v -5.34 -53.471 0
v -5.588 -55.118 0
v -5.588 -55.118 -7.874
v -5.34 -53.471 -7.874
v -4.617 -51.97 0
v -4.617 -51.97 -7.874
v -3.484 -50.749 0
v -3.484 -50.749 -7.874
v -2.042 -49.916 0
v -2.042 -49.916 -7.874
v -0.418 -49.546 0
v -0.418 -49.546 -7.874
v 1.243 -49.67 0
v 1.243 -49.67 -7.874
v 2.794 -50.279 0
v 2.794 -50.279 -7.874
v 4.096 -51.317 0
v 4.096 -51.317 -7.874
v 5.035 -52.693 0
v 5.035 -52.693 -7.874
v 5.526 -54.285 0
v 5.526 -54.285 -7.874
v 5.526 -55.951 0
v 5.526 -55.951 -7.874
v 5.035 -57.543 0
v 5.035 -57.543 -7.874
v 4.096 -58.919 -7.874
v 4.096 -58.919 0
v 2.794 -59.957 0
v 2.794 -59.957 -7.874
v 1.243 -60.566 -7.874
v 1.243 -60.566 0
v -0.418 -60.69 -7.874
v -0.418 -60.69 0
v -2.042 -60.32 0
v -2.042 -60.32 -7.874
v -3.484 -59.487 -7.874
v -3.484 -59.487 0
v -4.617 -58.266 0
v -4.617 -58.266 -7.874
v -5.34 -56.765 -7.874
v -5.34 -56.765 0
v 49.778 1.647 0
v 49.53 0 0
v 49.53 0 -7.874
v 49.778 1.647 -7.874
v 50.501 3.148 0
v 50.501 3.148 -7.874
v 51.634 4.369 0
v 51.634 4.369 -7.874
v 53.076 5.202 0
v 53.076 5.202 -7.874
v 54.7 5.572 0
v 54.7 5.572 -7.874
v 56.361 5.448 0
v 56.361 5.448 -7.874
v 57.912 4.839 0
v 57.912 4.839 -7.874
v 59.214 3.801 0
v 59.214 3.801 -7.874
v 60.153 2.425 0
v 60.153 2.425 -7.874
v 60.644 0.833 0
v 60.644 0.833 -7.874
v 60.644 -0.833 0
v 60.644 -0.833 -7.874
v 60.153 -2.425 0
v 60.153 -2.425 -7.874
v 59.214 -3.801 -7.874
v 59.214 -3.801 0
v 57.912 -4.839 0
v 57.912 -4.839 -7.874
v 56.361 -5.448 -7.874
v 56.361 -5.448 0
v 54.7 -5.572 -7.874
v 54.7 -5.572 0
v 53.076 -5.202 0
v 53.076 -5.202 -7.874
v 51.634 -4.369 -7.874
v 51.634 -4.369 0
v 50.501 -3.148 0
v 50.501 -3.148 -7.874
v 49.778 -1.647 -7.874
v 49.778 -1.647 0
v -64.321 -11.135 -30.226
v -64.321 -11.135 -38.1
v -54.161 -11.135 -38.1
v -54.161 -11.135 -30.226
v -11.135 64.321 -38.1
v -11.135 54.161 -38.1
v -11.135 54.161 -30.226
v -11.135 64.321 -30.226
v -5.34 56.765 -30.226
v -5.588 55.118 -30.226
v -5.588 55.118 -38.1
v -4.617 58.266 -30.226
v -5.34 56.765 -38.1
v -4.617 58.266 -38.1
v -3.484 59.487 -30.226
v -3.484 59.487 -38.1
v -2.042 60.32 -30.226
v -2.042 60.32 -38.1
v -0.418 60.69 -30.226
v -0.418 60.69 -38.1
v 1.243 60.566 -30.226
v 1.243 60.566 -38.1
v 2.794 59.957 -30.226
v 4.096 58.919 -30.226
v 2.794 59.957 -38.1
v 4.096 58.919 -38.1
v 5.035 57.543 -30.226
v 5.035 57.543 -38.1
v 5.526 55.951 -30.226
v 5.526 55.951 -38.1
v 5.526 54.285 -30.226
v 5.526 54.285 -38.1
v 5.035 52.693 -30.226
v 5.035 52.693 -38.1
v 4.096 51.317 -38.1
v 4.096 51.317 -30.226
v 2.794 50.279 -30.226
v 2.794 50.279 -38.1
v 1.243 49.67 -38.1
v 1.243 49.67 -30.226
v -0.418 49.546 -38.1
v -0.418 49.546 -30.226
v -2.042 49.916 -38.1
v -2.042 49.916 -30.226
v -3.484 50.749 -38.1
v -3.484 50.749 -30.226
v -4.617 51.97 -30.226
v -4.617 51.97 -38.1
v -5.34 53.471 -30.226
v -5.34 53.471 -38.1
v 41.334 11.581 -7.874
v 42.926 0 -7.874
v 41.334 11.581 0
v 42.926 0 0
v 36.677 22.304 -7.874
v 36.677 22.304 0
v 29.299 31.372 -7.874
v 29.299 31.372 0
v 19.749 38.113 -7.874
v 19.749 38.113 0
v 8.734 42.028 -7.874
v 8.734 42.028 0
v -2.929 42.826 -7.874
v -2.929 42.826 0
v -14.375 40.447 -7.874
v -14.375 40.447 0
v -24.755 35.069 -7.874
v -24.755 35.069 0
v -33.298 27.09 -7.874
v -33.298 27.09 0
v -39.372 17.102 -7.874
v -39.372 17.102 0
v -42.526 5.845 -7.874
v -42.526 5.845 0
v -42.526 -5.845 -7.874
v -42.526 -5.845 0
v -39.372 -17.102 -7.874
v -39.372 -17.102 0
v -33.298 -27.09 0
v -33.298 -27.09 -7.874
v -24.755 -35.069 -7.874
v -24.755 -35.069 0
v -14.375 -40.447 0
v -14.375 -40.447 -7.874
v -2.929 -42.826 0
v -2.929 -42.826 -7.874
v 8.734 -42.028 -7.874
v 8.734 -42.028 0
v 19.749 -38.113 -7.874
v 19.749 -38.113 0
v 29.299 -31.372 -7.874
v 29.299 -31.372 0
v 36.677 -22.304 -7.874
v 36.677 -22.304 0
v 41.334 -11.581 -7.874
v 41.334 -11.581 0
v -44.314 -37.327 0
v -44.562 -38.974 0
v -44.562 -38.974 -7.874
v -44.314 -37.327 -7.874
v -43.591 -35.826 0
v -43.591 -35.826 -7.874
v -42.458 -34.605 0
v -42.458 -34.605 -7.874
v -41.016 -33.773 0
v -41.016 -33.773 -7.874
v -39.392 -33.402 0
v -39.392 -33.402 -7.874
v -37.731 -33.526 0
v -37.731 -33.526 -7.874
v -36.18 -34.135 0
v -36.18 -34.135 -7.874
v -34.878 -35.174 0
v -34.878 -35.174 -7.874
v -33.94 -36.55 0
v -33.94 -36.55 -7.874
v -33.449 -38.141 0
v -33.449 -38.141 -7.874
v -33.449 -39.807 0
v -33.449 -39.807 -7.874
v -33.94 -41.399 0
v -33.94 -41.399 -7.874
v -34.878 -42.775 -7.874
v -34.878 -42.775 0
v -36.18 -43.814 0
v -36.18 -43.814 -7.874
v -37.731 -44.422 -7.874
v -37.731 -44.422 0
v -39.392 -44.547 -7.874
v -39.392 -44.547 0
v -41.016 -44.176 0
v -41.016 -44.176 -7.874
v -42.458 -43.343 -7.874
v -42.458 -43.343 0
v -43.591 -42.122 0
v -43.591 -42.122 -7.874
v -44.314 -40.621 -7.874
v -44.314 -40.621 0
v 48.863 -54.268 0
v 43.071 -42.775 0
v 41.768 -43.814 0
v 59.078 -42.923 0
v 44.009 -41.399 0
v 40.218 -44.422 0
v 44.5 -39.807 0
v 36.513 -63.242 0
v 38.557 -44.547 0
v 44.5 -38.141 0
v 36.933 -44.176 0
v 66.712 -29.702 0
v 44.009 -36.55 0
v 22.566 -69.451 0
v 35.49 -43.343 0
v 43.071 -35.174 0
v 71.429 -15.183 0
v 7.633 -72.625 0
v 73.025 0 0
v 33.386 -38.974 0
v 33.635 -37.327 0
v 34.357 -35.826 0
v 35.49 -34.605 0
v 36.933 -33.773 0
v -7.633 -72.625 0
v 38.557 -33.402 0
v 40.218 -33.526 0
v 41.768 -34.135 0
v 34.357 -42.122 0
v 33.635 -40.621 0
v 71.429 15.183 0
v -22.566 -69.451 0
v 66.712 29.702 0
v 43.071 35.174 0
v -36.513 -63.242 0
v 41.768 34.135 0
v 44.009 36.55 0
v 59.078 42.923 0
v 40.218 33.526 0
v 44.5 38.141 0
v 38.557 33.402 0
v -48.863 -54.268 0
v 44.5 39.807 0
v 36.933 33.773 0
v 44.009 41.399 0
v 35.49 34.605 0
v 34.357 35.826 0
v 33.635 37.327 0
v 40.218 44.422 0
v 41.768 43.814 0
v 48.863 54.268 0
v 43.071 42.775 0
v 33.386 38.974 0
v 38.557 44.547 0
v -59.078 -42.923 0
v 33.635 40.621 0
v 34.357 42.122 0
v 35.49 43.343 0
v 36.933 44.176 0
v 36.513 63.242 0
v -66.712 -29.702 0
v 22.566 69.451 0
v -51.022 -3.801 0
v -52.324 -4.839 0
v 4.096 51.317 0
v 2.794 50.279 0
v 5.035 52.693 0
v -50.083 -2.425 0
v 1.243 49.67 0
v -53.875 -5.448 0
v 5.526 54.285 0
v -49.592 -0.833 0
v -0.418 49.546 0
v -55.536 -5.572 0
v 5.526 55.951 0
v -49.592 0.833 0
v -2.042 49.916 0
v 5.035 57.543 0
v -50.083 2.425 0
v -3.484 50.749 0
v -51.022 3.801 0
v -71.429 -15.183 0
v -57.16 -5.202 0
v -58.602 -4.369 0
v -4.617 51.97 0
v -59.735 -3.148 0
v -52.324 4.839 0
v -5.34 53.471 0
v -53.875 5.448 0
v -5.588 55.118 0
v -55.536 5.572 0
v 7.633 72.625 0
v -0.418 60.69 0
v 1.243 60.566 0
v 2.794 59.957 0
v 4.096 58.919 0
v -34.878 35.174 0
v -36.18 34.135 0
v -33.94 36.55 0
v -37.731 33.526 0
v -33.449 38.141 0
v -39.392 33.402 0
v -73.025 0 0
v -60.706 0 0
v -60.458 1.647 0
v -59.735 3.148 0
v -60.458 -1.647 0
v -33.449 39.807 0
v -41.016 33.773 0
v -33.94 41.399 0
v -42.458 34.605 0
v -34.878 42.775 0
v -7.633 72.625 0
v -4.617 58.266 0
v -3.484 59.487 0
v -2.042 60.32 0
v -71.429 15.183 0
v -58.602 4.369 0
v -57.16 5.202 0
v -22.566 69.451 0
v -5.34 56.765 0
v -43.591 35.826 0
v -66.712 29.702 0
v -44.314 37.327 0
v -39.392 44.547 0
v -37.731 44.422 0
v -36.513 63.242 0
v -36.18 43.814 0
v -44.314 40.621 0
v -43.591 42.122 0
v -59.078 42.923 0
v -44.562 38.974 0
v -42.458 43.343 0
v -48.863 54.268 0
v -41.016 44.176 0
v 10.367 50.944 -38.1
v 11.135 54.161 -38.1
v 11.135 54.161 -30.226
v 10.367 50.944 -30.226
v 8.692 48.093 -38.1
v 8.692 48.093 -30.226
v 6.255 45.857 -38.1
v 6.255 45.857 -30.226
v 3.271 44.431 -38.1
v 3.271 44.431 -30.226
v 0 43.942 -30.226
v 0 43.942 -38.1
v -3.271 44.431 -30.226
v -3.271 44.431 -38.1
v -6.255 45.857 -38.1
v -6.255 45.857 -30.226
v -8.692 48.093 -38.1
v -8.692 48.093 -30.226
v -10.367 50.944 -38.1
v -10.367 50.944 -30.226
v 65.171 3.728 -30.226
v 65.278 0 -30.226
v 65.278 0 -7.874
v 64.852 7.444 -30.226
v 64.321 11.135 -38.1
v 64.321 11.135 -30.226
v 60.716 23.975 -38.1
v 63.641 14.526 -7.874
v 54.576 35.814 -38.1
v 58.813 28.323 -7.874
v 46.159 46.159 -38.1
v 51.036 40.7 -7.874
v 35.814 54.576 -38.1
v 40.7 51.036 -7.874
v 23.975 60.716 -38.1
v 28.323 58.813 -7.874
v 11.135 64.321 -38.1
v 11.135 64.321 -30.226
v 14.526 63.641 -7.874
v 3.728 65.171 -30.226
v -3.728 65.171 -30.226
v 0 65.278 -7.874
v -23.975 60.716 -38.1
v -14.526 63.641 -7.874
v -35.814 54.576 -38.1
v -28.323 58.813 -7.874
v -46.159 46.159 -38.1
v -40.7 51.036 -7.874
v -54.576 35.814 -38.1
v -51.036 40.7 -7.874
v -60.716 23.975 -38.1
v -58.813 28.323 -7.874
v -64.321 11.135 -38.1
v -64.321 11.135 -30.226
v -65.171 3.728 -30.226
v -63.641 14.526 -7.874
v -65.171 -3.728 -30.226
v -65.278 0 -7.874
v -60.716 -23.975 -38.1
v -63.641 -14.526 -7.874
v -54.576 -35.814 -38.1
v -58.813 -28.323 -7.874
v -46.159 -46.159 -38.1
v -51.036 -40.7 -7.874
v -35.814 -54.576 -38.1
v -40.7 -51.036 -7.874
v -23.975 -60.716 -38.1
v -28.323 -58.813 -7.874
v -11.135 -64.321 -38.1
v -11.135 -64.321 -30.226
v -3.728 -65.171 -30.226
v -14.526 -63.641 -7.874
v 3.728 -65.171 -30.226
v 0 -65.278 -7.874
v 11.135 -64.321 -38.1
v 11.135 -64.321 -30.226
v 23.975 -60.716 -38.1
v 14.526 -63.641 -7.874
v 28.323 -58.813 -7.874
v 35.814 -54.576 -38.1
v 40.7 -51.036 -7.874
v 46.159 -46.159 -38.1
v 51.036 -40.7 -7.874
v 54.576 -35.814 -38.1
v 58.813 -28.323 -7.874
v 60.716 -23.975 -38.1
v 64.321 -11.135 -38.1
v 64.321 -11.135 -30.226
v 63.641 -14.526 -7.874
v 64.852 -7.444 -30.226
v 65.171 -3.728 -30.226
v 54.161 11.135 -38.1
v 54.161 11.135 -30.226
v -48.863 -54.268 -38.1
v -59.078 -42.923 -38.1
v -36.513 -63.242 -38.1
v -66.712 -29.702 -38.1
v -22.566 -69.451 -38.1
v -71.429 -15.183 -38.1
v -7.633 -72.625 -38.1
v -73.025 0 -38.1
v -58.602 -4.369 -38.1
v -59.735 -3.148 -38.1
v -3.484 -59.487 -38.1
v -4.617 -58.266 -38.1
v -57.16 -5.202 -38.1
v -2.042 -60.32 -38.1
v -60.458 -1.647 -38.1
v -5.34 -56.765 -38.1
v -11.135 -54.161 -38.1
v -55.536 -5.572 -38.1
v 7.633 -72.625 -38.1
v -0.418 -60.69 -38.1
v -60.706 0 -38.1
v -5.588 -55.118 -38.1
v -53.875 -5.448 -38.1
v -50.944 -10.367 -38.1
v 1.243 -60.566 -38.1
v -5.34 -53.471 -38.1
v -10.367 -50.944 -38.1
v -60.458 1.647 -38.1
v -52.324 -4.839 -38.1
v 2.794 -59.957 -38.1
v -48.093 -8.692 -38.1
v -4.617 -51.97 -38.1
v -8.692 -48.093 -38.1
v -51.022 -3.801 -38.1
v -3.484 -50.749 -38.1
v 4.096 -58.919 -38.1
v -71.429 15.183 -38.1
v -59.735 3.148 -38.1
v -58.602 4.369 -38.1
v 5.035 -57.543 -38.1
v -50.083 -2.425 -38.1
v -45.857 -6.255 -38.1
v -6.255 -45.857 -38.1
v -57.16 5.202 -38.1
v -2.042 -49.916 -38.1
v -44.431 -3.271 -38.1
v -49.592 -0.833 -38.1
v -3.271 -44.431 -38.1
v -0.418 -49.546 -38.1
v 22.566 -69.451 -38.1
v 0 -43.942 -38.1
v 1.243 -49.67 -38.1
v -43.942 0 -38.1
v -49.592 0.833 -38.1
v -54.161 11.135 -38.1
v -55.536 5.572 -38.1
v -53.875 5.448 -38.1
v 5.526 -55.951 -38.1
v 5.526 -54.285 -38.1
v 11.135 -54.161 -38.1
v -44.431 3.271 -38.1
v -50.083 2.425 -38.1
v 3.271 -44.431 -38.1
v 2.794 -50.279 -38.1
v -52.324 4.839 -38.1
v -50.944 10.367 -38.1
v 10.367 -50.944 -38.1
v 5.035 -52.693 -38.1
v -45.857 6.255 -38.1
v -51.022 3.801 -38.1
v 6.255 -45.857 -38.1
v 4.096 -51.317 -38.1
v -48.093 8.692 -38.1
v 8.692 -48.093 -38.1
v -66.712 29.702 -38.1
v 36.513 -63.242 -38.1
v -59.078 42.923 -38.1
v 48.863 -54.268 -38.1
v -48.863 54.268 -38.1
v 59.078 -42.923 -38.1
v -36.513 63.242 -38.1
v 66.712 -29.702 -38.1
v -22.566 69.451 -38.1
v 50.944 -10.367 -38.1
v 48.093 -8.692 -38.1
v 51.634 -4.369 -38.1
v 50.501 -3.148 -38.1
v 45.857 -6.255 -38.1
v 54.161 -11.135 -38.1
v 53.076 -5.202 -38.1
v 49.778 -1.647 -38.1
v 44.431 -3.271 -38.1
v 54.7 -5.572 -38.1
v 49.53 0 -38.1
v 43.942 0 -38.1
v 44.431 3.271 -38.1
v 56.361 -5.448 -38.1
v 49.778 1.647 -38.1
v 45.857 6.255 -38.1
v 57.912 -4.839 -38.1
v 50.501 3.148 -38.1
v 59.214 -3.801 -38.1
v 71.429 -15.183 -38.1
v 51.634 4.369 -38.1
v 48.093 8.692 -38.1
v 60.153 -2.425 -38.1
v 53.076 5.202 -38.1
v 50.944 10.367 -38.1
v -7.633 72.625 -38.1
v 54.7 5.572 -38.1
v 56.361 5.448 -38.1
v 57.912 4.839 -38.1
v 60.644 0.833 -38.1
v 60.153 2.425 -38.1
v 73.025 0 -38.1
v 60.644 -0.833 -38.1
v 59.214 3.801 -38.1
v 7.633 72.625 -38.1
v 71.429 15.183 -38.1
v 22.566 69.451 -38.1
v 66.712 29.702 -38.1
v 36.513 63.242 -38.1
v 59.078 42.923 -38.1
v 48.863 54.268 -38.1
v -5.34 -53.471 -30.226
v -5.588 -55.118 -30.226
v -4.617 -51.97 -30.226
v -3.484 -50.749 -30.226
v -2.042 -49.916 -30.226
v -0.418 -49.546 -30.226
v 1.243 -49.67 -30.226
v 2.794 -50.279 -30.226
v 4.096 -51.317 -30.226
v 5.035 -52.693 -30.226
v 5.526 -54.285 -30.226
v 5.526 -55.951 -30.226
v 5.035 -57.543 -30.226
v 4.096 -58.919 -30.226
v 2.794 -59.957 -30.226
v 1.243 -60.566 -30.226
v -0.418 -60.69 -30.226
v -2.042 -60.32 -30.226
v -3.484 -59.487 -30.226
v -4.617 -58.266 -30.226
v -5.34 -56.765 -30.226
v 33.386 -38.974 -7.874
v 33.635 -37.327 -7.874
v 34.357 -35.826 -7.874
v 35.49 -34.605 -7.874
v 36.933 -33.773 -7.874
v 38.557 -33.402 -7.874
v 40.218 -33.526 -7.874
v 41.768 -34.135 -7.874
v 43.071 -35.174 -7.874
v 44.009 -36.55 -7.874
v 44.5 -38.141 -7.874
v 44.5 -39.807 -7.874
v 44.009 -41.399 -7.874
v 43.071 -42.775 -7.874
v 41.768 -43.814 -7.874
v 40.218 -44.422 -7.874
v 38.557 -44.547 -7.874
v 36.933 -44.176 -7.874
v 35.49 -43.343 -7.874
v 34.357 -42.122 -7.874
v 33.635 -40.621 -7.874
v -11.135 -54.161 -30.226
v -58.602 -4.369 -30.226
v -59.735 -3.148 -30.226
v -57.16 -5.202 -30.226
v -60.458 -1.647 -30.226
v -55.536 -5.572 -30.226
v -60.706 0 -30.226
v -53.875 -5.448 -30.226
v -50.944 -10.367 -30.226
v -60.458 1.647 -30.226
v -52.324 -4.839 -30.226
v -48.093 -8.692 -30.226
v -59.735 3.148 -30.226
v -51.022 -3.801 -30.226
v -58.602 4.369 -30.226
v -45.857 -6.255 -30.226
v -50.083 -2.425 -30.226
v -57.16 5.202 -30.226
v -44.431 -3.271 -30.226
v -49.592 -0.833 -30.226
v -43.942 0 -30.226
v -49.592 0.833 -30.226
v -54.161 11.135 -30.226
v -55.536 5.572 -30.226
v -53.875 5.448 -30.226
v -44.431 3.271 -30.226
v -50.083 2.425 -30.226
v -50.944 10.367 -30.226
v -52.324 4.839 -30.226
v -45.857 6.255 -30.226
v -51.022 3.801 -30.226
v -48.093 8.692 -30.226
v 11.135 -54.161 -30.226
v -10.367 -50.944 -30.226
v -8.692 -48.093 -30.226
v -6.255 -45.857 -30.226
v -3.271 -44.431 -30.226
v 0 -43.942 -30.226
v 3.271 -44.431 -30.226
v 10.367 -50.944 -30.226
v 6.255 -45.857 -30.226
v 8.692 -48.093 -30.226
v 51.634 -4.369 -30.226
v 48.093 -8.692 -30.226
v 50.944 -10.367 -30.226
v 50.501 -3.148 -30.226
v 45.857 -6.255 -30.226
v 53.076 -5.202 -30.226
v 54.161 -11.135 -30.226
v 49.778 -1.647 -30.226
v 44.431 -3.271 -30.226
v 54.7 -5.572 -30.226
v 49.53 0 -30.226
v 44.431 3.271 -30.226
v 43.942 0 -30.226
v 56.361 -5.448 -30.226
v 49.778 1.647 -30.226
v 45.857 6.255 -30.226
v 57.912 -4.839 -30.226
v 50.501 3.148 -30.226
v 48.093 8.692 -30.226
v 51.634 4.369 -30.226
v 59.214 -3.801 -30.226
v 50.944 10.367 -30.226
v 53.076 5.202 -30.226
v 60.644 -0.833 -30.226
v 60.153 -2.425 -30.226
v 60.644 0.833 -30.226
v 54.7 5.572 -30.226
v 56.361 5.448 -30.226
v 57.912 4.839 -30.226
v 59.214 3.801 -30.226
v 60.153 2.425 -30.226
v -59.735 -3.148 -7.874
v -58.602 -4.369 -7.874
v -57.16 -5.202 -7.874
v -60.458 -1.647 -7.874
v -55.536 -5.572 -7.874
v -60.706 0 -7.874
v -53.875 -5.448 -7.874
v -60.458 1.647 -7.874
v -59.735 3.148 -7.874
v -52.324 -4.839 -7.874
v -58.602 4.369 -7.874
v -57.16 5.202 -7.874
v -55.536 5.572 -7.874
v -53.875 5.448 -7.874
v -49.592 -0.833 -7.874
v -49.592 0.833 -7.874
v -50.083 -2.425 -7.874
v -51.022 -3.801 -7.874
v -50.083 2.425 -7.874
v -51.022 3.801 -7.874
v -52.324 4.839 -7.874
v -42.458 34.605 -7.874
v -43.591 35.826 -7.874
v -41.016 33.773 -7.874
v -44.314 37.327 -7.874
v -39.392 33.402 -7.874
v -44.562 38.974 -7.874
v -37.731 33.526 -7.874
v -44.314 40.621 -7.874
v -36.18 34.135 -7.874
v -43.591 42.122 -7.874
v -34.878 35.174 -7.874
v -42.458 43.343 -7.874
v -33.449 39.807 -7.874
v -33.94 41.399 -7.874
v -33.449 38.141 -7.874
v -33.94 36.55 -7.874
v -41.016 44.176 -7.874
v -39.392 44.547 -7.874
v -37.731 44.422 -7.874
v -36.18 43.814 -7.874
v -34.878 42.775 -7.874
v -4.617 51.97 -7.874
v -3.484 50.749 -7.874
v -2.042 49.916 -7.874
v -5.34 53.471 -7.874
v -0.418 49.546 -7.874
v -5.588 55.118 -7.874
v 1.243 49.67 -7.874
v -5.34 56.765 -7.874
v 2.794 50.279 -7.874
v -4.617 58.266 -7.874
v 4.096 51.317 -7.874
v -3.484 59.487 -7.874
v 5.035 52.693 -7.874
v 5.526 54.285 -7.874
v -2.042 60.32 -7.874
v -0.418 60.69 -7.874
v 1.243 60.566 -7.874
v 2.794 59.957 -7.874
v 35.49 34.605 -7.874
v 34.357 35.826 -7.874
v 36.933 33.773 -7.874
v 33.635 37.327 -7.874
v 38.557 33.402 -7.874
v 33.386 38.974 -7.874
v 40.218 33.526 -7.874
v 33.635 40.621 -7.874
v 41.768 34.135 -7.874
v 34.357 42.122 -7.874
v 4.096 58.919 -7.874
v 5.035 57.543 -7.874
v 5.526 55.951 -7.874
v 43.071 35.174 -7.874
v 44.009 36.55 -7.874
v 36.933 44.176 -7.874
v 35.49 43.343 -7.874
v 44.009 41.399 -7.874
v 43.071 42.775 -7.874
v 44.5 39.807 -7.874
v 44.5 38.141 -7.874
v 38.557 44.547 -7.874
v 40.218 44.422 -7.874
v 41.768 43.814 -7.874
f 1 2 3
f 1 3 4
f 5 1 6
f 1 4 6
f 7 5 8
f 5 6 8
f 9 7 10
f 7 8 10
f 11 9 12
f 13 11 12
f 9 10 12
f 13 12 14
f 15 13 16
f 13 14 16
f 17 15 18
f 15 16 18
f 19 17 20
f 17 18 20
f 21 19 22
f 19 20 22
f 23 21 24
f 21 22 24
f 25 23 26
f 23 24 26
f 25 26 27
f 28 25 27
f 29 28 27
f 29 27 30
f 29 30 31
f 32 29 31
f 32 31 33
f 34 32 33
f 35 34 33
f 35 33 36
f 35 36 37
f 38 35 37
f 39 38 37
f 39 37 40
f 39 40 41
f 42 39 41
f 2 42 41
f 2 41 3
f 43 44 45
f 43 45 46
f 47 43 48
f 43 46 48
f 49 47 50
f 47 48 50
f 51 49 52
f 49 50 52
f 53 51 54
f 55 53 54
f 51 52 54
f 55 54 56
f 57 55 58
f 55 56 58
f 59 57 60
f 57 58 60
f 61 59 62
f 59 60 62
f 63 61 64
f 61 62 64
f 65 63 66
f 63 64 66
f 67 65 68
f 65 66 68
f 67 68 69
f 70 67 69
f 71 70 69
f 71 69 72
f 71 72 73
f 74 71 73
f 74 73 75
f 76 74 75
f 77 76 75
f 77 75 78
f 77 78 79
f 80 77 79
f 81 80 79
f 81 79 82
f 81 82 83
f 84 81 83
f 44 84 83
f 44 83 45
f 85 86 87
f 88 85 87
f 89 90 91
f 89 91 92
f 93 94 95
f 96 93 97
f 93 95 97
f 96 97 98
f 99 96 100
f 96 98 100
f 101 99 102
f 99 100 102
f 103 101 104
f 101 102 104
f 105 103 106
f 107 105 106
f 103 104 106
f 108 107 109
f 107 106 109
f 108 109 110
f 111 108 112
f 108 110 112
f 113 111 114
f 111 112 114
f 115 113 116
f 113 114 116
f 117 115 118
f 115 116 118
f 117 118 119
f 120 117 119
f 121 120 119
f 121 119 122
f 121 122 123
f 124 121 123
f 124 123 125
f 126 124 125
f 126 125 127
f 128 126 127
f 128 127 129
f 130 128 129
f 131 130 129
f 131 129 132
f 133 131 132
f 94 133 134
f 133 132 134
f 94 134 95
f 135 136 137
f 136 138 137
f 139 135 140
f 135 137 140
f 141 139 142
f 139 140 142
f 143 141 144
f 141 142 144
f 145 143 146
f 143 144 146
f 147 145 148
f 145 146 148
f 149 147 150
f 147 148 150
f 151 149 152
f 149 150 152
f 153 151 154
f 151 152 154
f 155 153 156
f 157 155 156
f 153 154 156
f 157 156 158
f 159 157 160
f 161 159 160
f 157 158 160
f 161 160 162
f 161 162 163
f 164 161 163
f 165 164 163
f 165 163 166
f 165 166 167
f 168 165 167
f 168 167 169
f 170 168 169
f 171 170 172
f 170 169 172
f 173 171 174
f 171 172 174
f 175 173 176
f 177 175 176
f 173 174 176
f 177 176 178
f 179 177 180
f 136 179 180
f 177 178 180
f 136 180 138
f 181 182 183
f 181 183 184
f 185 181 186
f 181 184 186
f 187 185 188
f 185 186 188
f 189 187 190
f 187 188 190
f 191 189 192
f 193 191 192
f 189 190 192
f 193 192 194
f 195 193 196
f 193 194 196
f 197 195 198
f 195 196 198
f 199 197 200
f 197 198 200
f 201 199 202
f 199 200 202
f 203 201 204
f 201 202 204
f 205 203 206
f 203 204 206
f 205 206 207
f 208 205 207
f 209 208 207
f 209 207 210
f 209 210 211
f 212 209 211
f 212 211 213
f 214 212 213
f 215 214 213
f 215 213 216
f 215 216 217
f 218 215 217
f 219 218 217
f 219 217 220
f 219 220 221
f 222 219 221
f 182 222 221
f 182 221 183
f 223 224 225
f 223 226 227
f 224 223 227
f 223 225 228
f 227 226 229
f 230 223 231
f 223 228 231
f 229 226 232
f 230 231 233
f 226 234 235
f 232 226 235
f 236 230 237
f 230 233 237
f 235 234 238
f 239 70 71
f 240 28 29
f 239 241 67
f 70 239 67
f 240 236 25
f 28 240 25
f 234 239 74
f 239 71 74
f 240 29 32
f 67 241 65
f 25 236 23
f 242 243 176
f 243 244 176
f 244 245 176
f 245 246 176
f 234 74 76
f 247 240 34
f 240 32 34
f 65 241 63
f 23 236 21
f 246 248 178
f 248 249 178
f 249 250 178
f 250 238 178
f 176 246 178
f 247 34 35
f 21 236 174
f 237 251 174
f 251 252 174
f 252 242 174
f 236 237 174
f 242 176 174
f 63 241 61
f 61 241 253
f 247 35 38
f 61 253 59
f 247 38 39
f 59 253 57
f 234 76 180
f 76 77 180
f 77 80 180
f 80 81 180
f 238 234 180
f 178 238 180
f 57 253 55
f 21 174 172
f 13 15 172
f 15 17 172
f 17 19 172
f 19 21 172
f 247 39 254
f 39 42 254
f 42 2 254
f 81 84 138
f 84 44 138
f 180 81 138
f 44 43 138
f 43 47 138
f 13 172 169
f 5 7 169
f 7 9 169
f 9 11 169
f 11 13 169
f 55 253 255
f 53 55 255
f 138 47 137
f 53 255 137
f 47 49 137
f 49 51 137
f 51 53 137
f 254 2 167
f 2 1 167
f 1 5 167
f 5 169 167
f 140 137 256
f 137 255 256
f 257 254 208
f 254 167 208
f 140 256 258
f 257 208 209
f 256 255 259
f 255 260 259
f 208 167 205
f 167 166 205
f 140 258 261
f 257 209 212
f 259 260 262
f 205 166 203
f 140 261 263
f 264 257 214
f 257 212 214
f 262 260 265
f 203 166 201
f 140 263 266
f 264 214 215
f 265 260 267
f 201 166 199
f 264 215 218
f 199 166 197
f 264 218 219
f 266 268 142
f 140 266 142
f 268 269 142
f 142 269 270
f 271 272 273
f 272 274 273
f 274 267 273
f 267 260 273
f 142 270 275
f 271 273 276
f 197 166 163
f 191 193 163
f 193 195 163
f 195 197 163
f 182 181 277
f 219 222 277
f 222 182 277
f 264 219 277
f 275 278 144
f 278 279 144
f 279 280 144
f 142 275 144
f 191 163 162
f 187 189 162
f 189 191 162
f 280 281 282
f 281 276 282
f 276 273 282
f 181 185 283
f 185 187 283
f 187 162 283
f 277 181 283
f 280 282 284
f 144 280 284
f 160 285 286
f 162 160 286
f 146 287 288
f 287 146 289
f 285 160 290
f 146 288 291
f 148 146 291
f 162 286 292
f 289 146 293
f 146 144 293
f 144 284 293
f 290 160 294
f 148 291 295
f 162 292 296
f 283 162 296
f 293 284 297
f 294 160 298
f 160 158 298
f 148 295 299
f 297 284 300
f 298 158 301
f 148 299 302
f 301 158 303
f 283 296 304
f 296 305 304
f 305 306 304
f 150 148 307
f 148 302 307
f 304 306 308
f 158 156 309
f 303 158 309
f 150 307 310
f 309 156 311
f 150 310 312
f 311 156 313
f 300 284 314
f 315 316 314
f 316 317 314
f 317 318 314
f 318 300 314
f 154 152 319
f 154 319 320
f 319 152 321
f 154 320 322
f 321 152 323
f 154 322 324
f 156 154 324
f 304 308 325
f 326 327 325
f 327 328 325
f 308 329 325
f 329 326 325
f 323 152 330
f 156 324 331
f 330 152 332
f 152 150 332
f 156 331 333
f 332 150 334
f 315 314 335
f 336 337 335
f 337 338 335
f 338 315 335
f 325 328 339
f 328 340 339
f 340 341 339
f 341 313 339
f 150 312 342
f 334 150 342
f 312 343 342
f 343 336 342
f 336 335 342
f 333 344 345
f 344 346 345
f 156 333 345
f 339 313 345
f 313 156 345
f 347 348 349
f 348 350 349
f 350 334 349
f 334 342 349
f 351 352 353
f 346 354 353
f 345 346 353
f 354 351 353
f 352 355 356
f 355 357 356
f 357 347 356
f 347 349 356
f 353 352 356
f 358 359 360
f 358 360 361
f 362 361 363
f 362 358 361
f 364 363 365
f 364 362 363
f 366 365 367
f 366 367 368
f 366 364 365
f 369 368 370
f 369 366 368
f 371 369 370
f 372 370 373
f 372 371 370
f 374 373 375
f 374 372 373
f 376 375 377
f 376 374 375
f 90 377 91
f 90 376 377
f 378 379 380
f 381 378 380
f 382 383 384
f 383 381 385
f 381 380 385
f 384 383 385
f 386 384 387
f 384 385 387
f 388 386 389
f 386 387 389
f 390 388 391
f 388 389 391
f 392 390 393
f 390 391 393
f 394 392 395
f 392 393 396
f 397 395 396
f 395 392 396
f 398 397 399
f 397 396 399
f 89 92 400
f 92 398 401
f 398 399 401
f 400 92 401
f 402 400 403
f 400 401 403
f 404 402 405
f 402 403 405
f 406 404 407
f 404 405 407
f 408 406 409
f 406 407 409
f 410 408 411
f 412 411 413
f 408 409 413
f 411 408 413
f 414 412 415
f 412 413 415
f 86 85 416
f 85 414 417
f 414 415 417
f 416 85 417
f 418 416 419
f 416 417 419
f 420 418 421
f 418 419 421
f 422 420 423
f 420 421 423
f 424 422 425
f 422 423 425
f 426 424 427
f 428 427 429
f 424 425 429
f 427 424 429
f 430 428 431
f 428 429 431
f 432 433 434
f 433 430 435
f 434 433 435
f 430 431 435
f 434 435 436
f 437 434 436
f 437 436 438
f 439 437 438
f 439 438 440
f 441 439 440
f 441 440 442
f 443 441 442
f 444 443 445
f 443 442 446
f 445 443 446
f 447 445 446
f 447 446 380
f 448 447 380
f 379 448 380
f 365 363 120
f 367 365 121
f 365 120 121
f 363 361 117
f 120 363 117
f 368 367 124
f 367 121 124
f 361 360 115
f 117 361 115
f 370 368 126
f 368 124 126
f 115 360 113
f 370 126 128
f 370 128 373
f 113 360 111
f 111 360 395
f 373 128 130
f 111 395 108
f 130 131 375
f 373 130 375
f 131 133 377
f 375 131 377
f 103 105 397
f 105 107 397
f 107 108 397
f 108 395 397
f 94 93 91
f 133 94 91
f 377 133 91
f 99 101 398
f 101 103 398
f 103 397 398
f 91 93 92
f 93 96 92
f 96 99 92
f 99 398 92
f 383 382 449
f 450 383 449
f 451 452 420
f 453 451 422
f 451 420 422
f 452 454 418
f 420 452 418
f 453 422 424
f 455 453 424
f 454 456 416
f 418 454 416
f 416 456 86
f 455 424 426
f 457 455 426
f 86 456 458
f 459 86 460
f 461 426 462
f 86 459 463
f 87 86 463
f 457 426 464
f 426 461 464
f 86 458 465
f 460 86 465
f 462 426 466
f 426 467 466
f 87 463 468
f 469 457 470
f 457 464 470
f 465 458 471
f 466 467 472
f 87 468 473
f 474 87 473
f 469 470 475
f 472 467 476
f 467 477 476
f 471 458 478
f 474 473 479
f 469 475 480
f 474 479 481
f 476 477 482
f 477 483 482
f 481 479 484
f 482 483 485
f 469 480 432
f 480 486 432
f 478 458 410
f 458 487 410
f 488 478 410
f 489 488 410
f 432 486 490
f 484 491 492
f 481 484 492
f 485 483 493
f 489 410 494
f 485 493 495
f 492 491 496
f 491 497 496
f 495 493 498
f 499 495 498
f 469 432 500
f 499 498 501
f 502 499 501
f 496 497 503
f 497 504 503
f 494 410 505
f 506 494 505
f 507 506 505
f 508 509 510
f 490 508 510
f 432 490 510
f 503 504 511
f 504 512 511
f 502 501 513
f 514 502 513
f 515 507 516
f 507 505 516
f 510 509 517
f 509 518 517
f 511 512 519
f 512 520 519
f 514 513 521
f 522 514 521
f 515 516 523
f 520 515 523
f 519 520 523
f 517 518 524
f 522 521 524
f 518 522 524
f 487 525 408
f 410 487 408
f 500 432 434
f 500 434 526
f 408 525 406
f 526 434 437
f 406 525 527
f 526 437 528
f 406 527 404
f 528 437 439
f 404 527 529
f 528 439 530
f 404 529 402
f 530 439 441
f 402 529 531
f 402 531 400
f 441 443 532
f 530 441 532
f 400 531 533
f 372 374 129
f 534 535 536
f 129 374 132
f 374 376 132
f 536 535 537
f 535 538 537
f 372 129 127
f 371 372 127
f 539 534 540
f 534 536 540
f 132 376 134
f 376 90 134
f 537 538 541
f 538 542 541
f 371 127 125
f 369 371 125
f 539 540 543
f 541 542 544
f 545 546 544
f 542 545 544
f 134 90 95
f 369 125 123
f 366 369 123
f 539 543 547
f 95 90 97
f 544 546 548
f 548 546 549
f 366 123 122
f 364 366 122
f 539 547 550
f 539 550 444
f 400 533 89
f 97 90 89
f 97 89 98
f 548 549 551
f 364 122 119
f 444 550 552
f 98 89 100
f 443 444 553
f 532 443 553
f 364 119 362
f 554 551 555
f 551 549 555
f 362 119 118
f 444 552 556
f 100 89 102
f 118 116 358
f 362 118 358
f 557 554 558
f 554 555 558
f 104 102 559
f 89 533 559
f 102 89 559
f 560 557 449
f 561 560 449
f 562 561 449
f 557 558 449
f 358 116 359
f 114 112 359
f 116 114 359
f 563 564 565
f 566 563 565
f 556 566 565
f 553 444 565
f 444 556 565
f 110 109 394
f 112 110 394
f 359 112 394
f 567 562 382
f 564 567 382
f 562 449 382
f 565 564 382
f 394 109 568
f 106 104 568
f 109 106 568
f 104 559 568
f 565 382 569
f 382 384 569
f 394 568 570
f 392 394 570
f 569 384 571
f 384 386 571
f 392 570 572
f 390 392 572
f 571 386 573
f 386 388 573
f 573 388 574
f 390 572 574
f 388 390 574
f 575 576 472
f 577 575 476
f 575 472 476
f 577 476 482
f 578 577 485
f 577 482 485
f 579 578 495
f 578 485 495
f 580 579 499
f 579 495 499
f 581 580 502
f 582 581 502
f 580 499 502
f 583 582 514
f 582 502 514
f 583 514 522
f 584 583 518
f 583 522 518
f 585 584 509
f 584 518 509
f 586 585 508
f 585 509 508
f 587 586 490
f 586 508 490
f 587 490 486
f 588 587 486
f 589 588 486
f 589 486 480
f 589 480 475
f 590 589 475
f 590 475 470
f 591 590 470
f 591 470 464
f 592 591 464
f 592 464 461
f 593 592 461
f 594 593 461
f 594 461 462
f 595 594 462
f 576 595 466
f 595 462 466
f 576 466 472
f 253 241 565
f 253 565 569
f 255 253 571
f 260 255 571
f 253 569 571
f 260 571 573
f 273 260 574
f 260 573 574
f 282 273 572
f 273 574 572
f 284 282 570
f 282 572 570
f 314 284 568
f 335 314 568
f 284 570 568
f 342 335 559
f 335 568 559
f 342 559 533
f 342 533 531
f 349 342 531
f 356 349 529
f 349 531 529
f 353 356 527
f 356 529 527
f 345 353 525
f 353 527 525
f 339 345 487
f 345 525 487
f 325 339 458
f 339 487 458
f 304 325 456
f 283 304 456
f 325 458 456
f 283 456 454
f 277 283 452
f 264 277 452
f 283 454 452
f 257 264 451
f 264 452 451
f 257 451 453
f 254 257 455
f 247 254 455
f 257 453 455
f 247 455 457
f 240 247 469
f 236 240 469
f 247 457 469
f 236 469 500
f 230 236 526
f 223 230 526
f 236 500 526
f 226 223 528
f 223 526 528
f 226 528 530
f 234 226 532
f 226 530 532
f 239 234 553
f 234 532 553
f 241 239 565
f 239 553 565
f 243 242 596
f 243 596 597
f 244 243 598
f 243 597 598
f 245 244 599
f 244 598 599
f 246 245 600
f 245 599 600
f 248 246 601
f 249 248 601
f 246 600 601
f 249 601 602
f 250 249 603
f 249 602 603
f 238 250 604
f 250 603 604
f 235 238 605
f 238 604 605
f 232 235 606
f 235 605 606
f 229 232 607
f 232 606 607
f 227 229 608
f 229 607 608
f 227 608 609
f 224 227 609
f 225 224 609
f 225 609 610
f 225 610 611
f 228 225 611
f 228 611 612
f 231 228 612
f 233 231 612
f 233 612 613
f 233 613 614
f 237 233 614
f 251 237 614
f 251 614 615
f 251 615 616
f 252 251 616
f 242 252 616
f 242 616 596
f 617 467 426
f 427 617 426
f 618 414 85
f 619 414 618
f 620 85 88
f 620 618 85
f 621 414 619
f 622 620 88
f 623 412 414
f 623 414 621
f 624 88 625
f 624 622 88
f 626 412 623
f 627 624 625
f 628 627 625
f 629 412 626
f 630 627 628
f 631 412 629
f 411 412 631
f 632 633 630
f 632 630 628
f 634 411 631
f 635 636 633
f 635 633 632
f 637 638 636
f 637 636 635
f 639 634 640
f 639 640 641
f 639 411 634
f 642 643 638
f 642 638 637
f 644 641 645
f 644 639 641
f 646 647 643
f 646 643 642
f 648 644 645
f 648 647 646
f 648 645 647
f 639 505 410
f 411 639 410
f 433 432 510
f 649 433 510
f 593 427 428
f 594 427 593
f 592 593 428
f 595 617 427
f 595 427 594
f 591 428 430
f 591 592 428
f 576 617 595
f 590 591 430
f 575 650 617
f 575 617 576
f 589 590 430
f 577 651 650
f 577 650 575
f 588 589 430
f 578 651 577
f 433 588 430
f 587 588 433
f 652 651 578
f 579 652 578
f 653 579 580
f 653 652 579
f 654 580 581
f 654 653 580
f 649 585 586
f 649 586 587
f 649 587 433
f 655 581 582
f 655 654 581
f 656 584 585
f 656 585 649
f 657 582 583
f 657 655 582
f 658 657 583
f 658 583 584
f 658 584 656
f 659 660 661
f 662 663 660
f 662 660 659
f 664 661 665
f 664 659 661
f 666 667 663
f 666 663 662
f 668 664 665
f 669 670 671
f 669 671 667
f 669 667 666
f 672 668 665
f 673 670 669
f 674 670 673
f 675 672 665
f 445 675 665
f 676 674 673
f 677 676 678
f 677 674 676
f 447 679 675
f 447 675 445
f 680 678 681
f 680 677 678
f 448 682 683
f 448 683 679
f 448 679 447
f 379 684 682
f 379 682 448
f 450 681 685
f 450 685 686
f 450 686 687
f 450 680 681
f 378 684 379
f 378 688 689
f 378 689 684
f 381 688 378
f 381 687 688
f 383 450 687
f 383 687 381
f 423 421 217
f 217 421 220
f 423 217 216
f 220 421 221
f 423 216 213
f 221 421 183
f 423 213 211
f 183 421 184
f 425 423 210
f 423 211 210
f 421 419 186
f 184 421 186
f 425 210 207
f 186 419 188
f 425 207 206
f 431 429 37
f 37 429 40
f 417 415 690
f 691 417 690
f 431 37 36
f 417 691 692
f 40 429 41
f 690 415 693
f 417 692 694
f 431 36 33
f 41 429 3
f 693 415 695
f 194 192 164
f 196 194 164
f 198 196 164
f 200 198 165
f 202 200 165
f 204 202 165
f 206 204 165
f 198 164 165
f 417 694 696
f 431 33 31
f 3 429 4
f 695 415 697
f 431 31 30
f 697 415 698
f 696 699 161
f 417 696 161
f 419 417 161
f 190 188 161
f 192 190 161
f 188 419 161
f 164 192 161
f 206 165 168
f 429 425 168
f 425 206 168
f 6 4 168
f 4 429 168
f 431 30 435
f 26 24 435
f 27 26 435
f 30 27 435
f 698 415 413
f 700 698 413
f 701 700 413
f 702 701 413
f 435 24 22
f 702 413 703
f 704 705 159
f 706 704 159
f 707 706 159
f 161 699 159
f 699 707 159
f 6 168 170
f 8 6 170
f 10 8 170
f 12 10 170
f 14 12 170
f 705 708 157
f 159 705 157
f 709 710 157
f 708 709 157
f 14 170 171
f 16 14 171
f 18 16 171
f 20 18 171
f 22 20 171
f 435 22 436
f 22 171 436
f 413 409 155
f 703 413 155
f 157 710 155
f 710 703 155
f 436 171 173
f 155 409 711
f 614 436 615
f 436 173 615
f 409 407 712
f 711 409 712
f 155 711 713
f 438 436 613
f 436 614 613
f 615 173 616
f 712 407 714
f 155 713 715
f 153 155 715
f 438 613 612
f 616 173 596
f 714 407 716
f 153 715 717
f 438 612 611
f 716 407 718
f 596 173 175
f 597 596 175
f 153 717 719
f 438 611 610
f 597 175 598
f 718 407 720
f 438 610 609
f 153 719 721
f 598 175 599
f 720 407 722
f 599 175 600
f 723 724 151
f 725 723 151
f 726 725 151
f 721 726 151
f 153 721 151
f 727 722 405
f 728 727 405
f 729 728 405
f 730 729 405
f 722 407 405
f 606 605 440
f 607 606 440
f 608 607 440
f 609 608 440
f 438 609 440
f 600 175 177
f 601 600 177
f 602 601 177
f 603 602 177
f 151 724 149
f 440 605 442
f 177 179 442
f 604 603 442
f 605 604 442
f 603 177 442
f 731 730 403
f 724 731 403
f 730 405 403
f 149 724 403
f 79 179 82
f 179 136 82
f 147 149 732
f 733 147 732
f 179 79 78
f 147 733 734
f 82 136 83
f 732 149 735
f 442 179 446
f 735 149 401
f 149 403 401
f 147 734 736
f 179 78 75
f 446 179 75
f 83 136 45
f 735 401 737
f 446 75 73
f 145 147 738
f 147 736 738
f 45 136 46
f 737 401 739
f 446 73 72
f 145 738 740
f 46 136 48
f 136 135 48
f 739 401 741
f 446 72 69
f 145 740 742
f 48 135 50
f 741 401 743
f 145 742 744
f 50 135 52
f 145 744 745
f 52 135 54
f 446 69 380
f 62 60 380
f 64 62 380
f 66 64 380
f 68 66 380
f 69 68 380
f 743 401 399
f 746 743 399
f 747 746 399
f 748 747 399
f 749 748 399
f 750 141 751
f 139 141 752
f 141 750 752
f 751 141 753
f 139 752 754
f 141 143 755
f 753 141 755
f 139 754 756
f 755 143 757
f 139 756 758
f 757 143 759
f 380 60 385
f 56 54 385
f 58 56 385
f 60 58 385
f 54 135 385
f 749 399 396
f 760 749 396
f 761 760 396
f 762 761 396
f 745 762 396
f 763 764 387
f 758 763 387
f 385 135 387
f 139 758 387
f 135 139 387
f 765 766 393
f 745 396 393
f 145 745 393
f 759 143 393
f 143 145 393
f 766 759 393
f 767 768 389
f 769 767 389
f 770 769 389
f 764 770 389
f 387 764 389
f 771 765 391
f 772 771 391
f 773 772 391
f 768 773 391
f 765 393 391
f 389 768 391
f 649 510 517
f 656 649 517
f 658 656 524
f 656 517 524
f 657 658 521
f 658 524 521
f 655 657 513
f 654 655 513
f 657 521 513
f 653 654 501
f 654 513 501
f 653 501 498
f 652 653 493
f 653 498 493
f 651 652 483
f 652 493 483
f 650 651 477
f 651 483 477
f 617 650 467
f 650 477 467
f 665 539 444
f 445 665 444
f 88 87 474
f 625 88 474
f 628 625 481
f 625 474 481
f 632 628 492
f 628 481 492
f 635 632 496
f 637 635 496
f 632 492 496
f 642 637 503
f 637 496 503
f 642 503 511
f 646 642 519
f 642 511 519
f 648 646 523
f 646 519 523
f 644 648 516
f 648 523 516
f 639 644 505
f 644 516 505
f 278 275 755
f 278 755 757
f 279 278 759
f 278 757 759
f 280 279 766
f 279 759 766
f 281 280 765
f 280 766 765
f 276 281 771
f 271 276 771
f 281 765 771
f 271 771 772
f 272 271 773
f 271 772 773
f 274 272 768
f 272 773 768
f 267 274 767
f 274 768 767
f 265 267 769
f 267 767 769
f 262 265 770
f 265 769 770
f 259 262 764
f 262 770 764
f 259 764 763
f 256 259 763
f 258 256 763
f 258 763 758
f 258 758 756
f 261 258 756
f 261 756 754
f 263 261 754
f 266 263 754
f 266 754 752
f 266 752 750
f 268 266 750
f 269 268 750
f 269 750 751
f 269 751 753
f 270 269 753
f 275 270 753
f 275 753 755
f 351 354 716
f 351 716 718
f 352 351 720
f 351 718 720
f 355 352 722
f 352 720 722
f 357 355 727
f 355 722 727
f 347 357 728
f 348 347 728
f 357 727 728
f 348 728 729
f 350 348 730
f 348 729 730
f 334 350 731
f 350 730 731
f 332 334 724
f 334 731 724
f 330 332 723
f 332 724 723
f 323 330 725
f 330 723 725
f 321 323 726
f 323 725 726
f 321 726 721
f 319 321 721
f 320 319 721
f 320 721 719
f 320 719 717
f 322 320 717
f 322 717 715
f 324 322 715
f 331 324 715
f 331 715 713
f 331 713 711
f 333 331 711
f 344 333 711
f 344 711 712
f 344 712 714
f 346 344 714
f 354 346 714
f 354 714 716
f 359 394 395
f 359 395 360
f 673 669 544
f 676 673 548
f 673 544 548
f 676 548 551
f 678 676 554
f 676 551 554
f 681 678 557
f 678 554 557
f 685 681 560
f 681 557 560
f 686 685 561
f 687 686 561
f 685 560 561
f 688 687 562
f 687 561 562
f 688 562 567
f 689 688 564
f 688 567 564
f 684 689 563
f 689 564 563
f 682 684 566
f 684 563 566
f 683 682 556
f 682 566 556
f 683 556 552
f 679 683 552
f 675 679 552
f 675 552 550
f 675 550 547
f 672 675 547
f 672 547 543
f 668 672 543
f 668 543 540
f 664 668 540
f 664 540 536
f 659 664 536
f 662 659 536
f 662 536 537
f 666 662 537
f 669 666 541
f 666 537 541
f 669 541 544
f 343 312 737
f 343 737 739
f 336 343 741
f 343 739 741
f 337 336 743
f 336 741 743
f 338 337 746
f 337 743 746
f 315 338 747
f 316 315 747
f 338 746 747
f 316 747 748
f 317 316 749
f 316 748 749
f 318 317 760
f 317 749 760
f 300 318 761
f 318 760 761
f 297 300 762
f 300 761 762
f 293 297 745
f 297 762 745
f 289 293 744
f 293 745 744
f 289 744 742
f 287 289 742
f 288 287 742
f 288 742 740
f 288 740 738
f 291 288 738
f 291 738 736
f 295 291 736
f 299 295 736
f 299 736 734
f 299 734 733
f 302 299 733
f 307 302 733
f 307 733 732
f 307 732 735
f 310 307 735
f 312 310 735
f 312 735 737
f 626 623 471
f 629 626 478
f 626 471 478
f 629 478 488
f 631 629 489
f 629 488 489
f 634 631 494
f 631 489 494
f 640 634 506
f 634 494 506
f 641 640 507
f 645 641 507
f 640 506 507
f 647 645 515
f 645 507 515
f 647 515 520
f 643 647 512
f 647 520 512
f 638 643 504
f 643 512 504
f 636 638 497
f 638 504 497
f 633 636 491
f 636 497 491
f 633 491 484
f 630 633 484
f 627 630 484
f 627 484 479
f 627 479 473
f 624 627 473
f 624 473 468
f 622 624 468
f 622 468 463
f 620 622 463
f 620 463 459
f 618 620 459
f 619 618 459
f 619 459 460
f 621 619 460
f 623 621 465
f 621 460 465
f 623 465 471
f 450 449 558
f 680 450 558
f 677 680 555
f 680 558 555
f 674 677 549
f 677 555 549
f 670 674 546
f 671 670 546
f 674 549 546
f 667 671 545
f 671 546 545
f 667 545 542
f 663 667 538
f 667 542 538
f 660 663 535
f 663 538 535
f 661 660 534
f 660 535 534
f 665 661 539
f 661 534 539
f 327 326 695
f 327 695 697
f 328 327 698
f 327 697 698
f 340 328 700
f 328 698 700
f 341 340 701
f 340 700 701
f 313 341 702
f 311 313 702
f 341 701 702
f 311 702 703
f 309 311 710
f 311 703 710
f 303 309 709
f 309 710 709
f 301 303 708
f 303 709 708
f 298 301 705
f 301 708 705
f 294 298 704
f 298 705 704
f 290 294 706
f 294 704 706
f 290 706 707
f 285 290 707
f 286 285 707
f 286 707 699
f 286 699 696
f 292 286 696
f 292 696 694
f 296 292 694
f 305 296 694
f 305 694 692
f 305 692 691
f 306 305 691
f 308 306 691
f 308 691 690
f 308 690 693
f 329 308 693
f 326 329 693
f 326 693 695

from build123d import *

# Parameters (mm, degrees)
SKETCH2_R           = 5.588
CUT_EXTRUDE1_DEPTH  = 8.874
SKETCH3_R           = 5.588
BOSS_EXTRUDE2_DEPTH = 7.874


with BuildPart() as part:
    # Sketch1 → Revolve1 (revolve)
    with BuildSketch(Plane(origin=(0, 0, 0), x_dir=(1, 0, 0), z_dir=(0, 1, 0))):
        Polygon((73.025, 0), (73.025, 7.874), (73.025, 38.1), (65.278, 38.1), (65.278, 7.874), (42.926, 7.874), (42.926, 0), align=None)
    revolve(axis=Axis((0, 0, -38.1), (0, 0, 1)))

    # Sketch2 → Cut-Extrude1 (cut, through all)
    with BuildSketch(Plane(origin=(0, 0, -7.874), x_dir=(-1, 0, 0), z_dir=(0, 0, -1))):
        with Locations((0, 55.118)):
            Circle(SKETCH2_R)
        with Locations((38.974311565, 38.974311565)):
            Circle(SKETCH2_R)
        with Locations((55.118, 0)):
            Circle(SKETCH2_R)
        with Locations((38.974311565, -38.974311565)):
            Circle(SKETCH2_R)
        with Locations((0, -55.118)):
            Circle(SKETCH2_R)
        with Locations((-38.974311565, -38.974311565)):
            Circle(SKETCH2_R)
        with Locations((-55.118, 0)):
            Circle(SKETCH2_R)
        with Locations((-38.974311565, 38.974311565)):
            Circle(SKETCH2_R)
    extrude(amount=-CUT_EXTRUDE1_DEPTH, mode=Mode.SUBTRACT)

    # Sketch3 → Boss-Extrude2 (add)
    with BuildSketch(Plane(origin=(0, 0, -38.1), x_dir=(-1, 0, 0), z_dir=(0, 0, -1))):
        with BuildLine():
            Line((11.134976442, 54.161299611), (11.134976442, 64.321299611))
            ThreePointArc((11.134976442, 64.321299611), (0, 65.278), (-11.134976442, 64.321299611))
            Line((-11.134976442, 64.321299611), (-11.134976442, 54.161299611))
            ThreePointArc((-11.134976442, 54.161299611), (0, 43.942), (11.134976442, 54.161299611))
        make_face()
        with Locations((0, 55.118)):
            Circle(SKETCH3_R, mode=Mode.SUBTRACT)
        with BuildLine():
            Line((54.161299611, 11.134976442), (64.321299611, 11.134976442))
            ThreePointArc((64.321299611, 11.134976442), (65.278, 0), (64.321299611, -11.134976442))
            Line((64.321299611, -11.134976442), (54.161299611, -11.134976442))
            ThreePointArc((54.161299611, -11.134976442), (43.942, 0), (54.161299611, 11.134976442))
        make_face()
        with Locations((55.118, 0)):
            Circle(SKETCH3_R, mode=Mode.SUBTRACT)
        with BuildLine():
            Line((11.134976442, -54.161299611), (11.134976442, -64.321299611))
            ThreePointArc((11.134976442, -64.321299611), (0, -65.278), (-11.134976442, -64.321299611))
            Line((-11.134976442, -64.321299611), (-11.134976442, -54.161299611))
            ThreePointArc((-11.134976442, -54.161299611), (0, -43.942), (11.134976442, -54.161299611))
        make_face()
        with Locations((0, -55.118)):
            Circle(SKETCH3_R, mode=Mode.SUBTRACT)
        with BuildLine():
            Line((-54.161299611, -11.134976442), (-64.321299611, -11.134976442))
            ThreePointArc((-64.321299611, -11.134976442), (-65.278, 0), (-64.321299611, 11.134976442))
            Line((-64.321299611, 11.134976442), (-54.161299611, 11.134976442))
            ThreePointArc((-54.161299611, 11.134976442), (-43.942, 0), (-54.161299611, -11.134976442))
        make_face()
        with Locations((-55.118, 0)):
            Circle(SKETCH3_R, mode=Mode.SUBTRACT)
    extrude(amount=-BOSS_EXTRUDE2_DEPTH)


solid = part.part
